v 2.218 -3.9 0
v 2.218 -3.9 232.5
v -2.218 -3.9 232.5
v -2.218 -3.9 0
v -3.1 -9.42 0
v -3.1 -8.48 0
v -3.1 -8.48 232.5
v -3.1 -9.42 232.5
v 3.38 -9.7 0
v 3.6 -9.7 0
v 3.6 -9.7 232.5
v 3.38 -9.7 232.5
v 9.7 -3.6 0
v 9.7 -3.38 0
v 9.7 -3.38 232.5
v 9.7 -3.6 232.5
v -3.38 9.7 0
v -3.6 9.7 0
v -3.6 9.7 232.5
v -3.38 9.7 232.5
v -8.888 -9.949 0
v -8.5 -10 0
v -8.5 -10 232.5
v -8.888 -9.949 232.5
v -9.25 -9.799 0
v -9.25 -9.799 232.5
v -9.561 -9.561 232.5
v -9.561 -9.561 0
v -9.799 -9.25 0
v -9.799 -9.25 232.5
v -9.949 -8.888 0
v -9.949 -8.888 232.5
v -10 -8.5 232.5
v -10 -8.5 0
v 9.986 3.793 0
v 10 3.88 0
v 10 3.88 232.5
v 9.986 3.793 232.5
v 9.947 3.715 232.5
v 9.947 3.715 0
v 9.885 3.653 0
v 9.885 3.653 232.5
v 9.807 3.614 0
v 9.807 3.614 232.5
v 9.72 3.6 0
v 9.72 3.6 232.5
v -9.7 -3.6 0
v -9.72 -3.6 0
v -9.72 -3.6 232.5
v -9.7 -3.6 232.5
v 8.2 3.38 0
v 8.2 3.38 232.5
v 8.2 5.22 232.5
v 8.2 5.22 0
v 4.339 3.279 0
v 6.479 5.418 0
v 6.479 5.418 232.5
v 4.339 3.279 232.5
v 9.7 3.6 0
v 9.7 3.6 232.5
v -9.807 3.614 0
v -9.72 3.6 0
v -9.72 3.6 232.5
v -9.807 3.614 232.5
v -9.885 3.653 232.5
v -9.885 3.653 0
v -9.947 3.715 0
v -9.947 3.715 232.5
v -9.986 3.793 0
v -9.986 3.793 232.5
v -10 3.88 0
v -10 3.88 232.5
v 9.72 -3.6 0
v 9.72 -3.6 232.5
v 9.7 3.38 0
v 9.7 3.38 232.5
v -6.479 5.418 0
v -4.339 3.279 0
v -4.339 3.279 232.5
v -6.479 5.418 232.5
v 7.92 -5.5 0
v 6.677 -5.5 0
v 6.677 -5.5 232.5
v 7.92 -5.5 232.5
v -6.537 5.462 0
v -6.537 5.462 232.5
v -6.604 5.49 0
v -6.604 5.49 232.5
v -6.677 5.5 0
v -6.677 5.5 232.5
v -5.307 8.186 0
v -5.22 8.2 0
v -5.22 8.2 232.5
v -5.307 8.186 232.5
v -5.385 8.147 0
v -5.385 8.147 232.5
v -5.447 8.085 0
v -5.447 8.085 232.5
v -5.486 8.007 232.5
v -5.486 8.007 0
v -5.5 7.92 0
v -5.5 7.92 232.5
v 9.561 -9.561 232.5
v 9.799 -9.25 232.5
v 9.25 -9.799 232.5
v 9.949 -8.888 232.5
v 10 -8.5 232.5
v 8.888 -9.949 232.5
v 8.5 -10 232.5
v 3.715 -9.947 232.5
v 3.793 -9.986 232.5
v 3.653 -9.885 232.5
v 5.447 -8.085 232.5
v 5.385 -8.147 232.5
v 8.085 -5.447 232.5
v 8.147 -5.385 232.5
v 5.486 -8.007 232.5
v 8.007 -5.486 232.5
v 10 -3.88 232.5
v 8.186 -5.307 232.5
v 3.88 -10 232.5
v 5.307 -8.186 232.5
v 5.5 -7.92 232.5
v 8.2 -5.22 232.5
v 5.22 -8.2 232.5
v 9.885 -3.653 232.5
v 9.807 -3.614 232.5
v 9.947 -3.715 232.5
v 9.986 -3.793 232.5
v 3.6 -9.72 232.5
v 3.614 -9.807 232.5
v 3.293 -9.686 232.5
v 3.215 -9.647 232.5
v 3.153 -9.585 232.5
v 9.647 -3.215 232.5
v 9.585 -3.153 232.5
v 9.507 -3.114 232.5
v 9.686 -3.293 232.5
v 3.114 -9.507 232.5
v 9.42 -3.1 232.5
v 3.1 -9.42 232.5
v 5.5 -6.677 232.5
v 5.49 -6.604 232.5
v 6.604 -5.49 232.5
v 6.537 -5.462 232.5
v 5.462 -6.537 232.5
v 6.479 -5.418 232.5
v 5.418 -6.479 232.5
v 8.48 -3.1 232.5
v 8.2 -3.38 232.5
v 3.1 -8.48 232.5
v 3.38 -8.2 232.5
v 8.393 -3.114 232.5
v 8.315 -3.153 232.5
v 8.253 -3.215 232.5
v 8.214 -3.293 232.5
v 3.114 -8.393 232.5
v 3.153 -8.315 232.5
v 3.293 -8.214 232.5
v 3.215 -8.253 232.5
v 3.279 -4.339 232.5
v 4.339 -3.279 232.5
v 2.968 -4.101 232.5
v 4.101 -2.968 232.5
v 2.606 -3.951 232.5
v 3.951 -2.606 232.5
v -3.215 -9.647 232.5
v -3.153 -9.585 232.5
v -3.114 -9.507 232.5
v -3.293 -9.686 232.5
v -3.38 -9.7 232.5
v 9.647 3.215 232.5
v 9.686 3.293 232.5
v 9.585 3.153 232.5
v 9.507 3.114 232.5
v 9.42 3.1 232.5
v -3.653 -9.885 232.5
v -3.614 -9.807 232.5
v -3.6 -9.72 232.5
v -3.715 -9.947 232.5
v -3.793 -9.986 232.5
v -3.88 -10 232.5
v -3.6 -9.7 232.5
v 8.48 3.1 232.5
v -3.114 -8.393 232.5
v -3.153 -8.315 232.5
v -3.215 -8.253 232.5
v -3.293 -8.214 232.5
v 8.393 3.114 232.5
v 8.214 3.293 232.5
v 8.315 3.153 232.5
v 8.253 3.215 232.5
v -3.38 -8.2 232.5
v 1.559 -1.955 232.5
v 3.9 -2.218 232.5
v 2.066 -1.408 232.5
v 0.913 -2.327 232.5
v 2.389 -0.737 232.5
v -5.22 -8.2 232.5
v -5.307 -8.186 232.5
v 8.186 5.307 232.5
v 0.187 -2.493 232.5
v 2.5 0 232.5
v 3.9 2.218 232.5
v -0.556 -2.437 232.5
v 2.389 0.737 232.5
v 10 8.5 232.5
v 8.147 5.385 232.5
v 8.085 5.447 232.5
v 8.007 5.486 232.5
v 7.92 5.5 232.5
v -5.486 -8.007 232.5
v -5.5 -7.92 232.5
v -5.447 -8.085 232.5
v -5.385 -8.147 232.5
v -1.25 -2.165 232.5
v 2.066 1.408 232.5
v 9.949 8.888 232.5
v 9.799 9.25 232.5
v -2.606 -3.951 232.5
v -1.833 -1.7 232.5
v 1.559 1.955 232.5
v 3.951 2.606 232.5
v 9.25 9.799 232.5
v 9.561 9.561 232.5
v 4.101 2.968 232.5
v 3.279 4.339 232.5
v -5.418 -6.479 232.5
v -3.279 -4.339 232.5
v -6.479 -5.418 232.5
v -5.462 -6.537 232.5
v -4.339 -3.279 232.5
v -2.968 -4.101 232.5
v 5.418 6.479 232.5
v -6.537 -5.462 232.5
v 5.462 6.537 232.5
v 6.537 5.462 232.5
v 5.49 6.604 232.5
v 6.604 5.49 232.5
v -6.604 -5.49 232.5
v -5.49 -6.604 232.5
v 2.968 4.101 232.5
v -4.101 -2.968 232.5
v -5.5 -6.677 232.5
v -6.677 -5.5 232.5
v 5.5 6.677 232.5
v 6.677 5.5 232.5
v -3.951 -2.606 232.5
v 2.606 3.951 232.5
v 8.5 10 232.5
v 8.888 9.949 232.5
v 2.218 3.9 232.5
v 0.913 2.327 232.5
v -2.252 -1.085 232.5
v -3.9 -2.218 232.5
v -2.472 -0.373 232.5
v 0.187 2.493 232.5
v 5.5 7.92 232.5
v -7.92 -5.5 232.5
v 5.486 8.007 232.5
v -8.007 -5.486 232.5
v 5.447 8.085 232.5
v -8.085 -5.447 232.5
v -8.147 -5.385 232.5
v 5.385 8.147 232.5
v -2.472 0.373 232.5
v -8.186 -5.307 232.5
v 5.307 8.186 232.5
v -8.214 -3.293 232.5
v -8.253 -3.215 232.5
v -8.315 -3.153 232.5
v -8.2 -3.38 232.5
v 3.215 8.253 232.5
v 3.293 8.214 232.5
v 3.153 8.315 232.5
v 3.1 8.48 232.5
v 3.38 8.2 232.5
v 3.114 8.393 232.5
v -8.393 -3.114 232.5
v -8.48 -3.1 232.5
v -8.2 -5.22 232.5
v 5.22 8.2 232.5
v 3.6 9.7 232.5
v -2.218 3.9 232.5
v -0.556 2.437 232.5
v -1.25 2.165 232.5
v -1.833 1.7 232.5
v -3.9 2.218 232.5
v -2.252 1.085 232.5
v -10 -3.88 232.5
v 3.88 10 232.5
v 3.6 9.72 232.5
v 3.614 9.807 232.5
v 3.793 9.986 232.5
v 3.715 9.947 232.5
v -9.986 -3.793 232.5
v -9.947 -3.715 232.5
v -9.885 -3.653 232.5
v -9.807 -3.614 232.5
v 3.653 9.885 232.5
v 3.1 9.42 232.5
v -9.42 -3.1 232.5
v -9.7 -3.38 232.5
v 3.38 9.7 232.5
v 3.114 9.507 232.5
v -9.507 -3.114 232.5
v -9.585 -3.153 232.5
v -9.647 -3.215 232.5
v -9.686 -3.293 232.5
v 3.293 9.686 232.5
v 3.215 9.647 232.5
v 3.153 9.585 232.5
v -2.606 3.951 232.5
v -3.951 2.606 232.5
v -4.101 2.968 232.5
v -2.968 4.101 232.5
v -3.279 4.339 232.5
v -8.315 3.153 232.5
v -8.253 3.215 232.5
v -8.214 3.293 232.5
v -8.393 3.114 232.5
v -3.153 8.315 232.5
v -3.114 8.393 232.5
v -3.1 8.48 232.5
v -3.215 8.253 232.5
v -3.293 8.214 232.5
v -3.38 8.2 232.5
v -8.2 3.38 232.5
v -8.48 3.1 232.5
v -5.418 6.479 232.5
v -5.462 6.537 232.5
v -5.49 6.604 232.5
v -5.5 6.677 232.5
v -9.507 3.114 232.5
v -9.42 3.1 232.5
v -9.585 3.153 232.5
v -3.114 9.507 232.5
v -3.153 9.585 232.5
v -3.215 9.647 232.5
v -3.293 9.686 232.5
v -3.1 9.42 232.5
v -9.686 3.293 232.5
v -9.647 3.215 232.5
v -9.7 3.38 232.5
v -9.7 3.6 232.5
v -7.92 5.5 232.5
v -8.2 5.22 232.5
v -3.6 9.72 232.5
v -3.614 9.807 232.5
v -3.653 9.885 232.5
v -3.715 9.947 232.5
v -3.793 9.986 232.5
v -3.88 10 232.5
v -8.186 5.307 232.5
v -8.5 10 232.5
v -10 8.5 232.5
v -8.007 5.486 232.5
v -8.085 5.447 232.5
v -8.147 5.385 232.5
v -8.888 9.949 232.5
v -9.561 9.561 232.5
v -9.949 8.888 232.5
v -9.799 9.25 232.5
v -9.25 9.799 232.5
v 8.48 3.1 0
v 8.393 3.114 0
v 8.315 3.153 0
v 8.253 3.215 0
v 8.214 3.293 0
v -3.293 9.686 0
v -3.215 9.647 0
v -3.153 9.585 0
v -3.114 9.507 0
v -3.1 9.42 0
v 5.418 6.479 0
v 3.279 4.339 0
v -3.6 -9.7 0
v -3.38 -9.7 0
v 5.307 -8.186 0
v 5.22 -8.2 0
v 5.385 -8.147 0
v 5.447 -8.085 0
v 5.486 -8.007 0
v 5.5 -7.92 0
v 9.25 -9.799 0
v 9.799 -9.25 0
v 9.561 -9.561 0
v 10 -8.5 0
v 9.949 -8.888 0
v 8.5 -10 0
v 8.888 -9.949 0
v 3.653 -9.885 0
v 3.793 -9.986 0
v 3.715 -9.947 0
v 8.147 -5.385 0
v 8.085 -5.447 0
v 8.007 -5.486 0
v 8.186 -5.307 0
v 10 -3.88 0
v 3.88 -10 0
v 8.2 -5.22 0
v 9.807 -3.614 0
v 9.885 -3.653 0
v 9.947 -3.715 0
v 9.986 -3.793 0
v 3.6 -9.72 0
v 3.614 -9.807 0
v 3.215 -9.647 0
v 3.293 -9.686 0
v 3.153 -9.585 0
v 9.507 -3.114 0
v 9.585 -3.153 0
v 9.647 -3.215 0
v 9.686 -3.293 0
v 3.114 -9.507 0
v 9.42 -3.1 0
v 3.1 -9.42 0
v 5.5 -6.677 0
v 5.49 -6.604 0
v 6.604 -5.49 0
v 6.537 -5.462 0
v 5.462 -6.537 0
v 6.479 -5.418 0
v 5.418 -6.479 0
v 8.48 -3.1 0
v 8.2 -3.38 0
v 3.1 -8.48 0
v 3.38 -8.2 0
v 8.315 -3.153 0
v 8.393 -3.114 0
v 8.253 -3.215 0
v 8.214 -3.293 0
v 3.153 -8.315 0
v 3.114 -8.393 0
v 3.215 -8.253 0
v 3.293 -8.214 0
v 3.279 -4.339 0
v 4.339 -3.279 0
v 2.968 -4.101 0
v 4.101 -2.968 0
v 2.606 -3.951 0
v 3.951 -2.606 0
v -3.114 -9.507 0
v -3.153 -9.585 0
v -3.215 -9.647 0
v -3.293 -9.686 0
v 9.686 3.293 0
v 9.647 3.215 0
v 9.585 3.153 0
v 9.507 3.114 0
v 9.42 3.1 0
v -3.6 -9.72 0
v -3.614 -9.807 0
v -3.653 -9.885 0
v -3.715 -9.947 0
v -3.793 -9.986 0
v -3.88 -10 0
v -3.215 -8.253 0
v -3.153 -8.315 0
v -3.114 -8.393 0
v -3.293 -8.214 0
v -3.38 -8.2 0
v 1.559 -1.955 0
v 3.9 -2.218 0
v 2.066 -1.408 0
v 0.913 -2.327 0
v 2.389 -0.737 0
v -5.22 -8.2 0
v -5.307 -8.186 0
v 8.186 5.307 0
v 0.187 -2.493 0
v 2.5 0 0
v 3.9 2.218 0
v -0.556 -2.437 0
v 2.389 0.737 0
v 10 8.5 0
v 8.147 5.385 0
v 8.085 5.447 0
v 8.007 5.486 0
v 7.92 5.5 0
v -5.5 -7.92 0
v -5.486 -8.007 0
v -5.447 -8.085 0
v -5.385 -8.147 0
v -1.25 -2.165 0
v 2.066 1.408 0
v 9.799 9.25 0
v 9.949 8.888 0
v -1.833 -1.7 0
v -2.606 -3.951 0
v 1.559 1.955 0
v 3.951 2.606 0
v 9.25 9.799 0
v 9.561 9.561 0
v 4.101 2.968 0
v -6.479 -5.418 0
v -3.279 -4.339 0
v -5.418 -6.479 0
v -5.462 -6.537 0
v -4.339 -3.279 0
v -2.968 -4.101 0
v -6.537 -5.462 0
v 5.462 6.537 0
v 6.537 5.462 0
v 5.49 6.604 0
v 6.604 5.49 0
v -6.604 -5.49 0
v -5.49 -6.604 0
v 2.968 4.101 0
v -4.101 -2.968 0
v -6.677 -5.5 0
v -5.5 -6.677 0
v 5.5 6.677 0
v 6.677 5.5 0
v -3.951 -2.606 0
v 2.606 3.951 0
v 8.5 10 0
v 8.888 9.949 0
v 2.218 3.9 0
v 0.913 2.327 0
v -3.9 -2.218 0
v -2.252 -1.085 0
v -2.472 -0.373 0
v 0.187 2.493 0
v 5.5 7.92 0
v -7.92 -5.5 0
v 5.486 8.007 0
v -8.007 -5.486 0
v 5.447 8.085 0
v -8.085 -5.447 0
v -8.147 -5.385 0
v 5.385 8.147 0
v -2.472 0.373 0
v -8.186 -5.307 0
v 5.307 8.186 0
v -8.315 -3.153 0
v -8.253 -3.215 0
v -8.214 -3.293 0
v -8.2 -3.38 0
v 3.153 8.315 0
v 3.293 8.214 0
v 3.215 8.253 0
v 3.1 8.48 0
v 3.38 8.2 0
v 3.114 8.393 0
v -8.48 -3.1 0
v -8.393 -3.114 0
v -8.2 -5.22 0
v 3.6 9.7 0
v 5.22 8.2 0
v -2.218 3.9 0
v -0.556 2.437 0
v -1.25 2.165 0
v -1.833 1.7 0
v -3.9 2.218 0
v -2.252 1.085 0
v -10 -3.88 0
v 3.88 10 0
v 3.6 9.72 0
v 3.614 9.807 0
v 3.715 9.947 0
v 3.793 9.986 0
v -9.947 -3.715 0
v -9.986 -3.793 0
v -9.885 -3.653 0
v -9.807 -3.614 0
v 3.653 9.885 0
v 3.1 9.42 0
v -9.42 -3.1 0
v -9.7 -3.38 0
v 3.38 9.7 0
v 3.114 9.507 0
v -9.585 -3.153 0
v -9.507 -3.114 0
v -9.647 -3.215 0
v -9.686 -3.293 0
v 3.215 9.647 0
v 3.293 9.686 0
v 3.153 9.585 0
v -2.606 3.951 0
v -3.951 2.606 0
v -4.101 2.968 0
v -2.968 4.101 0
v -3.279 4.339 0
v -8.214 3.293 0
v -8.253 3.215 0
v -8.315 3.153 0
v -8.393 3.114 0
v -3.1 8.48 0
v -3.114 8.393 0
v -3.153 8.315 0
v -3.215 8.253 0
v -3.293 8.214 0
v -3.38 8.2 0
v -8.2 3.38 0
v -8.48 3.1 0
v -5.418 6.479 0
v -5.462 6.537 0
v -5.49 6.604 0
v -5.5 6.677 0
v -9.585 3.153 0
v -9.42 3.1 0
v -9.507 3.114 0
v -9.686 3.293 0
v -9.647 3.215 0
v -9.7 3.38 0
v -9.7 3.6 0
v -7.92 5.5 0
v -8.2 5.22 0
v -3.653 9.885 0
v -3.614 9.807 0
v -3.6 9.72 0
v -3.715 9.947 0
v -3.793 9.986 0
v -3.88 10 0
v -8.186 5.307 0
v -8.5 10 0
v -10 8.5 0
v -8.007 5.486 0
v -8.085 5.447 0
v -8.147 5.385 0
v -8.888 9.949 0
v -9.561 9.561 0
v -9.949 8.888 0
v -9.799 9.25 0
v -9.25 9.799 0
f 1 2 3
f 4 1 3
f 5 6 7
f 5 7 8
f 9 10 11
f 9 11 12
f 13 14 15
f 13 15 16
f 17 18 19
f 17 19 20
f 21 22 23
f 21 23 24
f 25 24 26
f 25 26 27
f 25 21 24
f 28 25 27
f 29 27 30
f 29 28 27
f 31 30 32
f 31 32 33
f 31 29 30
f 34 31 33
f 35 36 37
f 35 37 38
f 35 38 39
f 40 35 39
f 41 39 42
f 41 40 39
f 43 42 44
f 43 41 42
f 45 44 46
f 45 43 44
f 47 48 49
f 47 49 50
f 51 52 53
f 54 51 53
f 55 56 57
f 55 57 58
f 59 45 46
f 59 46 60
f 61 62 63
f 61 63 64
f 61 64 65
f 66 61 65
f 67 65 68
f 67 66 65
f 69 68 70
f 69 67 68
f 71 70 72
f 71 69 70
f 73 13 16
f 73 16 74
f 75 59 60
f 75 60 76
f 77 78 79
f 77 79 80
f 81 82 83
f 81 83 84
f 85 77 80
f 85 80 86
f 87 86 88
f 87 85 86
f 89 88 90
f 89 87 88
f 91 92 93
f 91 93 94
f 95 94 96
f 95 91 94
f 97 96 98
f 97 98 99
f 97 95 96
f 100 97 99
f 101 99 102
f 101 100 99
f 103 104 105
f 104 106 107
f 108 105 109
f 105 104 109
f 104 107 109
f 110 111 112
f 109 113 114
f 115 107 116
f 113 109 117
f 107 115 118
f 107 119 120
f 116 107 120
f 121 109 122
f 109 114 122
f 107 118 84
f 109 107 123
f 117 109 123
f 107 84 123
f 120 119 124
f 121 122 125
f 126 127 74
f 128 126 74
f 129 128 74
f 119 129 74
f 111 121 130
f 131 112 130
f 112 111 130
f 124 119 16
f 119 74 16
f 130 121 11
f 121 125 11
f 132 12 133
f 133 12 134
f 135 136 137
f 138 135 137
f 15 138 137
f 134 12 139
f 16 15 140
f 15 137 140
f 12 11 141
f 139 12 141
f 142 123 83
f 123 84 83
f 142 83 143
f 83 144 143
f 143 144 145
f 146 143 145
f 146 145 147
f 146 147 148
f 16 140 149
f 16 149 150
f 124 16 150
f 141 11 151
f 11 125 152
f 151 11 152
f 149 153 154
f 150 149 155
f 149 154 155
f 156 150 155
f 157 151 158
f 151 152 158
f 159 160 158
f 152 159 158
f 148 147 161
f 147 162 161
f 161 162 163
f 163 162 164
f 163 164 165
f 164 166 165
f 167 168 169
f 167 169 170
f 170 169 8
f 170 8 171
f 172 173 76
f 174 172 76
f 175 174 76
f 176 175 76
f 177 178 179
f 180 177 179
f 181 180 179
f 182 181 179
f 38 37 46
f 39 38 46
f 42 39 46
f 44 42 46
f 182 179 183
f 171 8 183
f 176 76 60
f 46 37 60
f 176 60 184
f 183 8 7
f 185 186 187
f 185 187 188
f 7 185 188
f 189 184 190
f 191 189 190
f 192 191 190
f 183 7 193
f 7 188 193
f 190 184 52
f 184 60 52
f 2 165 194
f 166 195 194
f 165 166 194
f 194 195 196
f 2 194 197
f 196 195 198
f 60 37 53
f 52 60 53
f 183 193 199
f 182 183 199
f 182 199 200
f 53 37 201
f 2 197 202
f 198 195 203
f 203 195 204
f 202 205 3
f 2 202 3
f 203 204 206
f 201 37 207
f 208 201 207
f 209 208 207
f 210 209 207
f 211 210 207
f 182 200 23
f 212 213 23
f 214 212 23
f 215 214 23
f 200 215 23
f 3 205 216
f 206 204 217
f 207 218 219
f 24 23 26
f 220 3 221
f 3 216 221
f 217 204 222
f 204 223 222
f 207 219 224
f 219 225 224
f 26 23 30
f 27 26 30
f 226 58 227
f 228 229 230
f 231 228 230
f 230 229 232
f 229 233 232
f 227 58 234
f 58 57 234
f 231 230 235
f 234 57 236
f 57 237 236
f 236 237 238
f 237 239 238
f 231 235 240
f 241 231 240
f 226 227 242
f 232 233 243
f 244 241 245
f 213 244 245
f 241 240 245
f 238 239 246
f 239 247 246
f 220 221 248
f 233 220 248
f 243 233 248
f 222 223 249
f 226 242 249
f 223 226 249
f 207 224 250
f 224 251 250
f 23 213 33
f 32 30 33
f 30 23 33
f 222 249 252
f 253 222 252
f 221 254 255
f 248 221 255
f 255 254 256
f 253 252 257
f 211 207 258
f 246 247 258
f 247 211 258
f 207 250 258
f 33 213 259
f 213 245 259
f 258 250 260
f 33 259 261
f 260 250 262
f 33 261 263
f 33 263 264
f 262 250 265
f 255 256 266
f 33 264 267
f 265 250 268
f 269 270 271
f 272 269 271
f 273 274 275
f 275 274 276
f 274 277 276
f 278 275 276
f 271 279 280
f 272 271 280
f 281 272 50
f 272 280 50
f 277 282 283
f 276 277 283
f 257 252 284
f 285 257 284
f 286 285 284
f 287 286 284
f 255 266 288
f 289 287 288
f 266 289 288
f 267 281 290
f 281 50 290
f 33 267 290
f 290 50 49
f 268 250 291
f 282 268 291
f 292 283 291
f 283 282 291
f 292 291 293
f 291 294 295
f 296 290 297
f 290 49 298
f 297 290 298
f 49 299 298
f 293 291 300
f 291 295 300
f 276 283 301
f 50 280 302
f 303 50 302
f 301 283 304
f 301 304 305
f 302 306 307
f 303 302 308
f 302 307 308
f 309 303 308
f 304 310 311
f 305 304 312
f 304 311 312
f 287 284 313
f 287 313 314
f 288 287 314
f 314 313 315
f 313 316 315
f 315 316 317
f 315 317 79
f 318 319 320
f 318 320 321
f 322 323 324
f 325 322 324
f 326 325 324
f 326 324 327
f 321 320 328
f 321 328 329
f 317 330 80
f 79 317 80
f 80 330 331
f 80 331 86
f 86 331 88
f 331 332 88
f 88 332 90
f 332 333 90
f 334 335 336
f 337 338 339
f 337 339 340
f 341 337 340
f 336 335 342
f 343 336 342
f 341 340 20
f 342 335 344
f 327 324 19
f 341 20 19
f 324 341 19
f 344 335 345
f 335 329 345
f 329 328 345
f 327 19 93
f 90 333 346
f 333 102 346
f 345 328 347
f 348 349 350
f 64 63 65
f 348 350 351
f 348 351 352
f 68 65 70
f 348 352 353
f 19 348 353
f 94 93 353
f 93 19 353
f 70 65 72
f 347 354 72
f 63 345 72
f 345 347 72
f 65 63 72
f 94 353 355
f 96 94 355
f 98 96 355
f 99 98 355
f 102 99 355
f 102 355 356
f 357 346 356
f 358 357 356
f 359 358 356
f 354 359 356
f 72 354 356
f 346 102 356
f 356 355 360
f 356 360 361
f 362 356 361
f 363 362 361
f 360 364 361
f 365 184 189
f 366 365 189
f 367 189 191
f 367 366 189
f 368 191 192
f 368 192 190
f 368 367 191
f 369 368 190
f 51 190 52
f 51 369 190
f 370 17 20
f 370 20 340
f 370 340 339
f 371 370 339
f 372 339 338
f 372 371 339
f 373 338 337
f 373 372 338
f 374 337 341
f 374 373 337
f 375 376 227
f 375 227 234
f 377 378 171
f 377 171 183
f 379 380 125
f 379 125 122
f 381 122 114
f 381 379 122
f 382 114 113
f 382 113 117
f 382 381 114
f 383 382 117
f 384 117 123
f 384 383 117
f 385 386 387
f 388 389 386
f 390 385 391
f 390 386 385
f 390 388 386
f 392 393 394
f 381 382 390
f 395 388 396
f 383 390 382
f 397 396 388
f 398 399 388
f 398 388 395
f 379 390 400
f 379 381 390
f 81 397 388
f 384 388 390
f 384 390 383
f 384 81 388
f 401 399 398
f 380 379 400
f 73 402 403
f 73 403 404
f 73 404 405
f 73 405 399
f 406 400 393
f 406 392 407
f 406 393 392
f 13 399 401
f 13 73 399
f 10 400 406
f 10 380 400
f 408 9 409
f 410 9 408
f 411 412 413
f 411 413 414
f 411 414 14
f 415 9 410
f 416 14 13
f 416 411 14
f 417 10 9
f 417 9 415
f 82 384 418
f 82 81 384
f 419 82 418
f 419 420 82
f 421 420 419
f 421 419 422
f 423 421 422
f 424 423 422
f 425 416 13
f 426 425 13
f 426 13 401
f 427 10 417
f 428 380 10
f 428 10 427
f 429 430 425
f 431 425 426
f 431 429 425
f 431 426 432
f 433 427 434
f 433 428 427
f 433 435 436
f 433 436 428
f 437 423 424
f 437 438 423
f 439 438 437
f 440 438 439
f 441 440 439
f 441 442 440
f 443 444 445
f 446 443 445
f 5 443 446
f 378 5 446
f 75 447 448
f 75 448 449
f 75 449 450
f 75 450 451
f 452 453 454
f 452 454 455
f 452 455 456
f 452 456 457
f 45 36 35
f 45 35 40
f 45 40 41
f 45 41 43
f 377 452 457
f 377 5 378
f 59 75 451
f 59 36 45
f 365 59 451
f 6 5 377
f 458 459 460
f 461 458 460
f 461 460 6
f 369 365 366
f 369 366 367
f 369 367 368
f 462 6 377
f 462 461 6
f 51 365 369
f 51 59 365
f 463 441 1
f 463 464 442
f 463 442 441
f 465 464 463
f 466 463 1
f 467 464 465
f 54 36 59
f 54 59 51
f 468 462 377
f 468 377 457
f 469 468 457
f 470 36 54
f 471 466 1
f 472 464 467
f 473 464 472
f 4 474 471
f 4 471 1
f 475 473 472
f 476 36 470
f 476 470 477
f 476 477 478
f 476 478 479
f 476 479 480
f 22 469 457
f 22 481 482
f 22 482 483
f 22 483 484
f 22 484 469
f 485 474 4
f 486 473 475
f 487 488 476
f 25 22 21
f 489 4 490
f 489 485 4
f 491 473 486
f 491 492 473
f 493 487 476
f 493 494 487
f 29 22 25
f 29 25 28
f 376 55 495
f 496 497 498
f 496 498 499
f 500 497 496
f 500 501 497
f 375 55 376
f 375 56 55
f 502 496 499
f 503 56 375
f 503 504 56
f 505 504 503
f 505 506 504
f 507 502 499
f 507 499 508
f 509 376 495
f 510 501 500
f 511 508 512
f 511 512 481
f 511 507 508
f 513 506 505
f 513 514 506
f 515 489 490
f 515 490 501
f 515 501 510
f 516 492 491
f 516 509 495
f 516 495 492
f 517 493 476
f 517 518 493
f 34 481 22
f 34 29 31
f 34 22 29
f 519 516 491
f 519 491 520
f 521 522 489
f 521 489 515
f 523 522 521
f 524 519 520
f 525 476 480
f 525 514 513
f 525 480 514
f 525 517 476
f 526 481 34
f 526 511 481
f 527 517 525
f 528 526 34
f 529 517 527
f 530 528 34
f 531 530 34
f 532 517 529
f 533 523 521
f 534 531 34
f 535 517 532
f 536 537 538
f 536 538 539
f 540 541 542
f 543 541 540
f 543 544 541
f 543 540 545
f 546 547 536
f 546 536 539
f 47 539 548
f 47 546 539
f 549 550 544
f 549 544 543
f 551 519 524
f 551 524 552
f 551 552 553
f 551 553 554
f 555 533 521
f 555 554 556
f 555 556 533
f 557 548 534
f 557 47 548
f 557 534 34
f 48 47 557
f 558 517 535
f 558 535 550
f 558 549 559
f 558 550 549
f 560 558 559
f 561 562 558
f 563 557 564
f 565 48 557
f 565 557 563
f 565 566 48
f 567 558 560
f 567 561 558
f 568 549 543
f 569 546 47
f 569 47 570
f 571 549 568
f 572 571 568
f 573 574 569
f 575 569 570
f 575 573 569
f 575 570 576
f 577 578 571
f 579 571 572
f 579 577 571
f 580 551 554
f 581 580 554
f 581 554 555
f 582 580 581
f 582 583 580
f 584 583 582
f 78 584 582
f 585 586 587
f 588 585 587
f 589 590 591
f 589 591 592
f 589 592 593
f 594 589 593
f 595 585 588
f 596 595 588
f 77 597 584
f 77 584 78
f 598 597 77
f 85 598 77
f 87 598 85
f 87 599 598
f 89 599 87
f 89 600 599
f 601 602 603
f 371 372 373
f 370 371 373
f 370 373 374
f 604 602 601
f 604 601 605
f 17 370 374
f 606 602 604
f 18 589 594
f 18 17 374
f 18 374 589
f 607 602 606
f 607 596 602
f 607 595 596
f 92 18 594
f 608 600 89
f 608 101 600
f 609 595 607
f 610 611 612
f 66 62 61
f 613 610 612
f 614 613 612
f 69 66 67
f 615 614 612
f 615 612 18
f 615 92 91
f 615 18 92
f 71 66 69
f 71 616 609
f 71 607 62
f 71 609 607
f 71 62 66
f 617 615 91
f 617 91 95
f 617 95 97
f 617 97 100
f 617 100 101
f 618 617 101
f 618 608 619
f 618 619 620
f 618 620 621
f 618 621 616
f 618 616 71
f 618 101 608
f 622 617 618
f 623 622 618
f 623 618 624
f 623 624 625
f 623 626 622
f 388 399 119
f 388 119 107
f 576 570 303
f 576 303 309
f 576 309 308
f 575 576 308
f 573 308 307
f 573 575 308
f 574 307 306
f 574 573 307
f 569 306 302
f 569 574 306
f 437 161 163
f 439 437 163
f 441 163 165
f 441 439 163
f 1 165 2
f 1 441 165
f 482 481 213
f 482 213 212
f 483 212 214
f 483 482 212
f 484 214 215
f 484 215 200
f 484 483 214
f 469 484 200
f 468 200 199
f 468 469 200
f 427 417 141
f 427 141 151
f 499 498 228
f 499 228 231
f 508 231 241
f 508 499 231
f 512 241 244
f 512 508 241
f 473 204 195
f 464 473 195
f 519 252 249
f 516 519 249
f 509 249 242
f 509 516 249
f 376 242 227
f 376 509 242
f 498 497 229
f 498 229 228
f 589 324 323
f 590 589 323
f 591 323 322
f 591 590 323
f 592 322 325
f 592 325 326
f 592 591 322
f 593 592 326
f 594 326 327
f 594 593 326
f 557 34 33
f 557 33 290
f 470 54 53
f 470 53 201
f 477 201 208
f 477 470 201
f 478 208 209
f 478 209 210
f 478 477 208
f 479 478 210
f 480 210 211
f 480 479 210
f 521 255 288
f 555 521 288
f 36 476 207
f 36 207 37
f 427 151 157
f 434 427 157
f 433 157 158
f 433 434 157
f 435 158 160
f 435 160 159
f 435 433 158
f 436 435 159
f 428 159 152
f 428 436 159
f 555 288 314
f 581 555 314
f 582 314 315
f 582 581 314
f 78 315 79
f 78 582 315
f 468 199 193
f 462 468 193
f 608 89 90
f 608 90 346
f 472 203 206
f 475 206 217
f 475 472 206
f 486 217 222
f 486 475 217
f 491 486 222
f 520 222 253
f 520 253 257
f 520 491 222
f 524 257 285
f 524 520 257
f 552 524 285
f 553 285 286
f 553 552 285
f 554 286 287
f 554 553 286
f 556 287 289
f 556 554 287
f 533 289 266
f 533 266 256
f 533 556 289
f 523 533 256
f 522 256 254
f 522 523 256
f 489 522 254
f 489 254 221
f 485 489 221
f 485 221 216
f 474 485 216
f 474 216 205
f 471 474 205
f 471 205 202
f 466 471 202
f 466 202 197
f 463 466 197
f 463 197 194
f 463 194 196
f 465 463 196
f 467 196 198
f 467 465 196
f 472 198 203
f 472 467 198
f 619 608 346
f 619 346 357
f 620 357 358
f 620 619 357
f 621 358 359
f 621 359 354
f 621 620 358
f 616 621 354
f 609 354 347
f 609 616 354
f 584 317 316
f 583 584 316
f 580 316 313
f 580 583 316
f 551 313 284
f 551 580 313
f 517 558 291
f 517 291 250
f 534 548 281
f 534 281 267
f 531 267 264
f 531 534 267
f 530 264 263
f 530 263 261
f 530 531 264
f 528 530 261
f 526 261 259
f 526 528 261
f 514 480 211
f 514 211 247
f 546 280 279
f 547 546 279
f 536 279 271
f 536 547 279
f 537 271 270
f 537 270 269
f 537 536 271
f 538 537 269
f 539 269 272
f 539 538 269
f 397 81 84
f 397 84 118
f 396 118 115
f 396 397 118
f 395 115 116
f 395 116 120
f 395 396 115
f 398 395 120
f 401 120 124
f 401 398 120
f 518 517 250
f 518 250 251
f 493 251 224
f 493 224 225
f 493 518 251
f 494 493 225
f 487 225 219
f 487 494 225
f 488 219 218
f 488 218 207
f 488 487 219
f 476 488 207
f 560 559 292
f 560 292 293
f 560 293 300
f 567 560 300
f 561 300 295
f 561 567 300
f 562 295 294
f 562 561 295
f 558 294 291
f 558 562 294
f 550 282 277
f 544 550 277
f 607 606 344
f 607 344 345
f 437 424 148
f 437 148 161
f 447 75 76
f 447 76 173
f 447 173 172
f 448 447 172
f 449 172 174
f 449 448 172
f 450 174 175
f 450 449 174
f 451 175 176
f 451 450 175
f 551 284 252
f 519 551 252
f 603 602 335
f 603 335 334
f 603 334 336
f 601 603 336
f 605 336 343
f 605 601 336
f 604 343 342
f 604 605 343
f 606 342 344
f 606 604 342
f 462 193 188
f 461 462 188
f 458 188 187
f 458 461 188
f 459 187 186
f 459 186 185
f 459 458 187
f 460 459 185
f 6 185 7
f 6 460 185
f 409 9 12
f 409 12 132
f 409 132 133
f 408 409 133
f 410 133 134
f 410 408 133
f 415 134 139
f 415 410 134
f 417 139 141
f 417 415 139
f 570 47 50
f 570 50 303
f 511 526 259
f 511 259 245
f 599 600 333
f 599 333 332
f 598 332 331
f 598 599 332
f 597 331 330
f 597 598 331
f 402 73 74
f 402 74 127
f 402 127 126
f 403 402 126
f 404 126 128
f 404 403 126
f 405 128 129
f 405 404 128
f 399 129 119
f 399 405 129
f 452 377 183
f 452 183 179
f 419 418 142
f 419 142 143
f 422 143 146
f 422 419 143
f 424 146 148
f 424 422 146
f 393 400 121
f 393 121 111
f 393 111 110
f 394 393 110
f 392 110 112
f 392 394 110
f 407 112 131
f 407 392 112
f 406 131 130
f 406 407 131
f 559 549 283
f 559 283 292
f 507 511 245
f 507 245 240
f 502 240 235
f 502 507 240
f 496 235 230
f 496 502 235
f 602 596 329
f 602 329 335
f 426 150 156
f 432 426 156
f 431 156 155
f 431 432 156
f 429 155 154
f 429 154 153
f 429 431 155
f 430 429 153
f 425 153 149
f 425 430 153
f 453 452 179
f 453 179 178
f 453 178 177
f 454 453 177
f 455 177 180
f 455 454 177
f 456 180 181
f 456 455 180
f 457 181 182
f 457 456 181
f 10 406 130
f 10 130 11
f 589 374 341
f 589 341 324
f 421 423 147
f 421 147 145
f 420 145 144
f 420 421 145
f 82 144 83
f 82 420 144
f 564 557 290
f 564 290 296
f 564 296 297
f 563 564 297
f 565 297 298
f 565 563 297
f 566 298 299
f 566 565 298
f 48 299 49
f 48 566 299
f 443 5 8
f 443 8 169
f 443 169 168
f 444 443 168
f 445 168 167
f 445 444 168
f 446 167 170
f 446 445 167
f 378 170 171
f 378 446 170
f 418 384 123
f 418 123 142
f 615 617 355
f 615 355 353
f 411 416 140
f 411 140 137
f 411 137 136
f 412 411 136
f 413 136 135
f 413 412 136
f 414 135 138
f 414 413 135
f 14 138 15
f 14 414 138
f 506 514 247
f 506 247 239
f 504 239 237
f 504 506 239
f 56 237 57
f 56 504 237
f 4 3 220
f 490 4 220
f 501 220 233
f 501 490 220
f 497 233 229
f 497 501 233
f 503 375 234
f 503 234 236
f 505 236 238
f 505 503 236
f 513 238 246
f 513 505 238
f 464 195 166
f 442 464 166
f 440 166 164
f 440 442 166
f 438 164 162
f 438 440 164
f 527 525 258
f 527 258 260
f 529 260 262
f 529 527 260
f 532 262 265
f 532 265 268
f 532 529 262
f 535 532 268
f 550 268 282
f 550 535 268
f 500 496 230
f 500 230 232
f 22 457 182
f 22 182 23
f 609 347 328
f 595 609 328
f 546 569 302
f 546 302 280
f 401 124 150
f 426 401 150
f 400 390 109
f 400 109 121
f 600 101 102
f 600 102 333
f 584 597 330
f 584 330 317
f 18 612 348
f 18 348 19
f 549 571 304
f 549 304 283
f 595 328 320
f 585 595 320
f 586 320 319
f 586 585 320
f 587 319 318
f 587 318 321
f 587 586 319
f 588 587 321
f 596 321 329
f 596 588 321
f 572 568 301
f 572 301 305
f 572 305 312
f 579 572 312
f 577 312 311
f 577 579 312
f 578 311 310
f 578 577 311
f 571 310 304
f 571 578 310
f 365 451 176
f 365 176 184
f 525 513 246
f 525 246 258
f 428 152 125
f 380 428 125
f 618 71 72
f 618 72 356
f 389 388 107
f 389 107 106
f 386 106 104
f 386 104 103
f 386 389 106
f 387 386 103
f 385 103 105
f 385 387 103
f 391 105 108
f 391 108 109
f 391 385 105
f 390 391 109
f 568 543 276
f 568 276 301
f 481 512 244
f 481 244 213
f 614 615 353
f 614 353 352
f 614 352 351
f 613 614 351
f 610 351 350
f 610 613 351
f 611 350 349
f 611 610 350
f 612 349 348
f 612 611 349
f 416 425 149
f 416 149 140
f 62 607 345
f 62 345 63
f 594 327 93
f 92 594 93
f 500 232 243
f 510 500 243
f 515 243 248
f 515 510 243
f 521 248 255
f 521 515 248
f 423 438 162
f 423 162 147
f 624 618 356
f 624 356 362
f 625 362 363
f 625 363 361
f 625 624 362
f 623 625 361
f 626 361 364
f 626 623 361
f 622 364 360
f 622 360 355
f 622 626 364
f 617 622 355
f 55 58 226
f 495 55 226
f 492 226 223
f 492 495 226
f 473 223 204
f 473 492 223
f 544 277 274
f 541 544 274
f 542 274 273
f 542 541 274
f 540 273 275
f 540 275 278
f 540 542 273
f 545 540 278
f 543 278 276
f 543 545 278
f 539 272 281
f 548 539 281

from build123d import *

# Parameters (mm, degrees)
CROQUIS3_R                = 2.5
PG20_T_SLOT_20X20_1_DEPTH = 232.5


with BuildPart() as part:
    # Croquis3 → Pg20_t_slot 20X20(1) (new body)
    with BuildSketch(Plane.XY):
        with BuildLine():
            Line((-2.218019485, 3.9), (2.218019485, 3.9))
            ThreePointArc((2.218019485, 3.9), (2.792044633, 4.014180701), (3.278679656, 4.339339828))
            Line((3.278679656, 4.339339828), (5.417989899, 6.478650071))
            ThreePointArc((5.417989899, 6.478650071), (5.478686269, 6.569488608), (5.5, 6.676639969))
            Line((5.5, 6.676639969), (5.5, 7.92))
            ThreePointArc((5.5, 7.92), (5.417989899, 8.117989899), (5.22, 8.2))
            Line((5.22, 8.2), (3.38, 8.2))
            ThreePointArc((3.38, 8.2), (3.182010101, 8.282010101), (3.1, 8.48))
            Line((3.1, 8.48), (3.1, 9.42))
            ThreePointArc((3.1, 9.42), (3.182010101, 9.617989899), (3.38, 9.7))
            Line((3.38, 9.7), (3.6, 9.7))
            Line((3.6, 9.7), (3.6, 9.72))
            ThreePointArc((3.6, 9.72), (3.682010101, 9.917989899), (3.88, 10))
            Line((3.88, 10), (8.5, 10))
            ThreePointArc((8.5, 10), (9.560660172, 9.560660172), (10, 8.5))
            Line((10, 8.5), (10, 3.88))
            ThreePointArc((10, 3.88), (9.917989899, 3.682010101), (9.72, 3.6))
            Line((9.72, 3.6), (9.7, 3.6))
            Line((9.7, 3.6), (9.7, 3.38))
            ThreePointArc((9.7, 3.38), (9.617989899, 3.182010101), (9.42, 3.1))
            Line((9.42, 3.1), (8.48, 3.1))
            ThreePointArc((8.48, 3.1), (8.282010101, 3.182010101), (8.2, 3.38))
            Line((8.2, 3.38), (8.2, 5.22))
            ThreePointArc((8.2, 5.22), (8.117989899, 5.417989899), (7.92, 5.5))
            Line((7.92, 5.5), (6.676639969, 5.5))
            ThreePointArc((6.676639969, 5.5), (6.569488608, 5.478686269), (6.478650071, 5.417989899))
            Line((6.478650071, 5.417989899), (4.339339828, 3.278679656))
            ThreePointArc((4.339339828, 3.278679656), (4.014180701, 2.792044633), (3.9, 2.218019485))
            Line((3.9, 2.218019485), (3.9, -2.218019485))
            ThreePointArc((3.9, -2.218019485), (4.014180701, -2.792044633), (4.339339828, -3.278679656))
            Line((4.339339828, -3.278679656), (6.478650071, -5.417989899))
            ThreePointArc((6.478650071, -5.417989899), (6.569488608, -5.478686269), (6.676639969, -5.5))
            Line((6.676639969, -5.5), (7.92, -5.5))
            ThreePointArc((7.92, -5.5), (8.117989899, -5.417989899), (8.2, -5.22))
            Line((8.2, -5.22), (8.2, -3.38))
            ThreePointArc((8.2, -3.38), (8.282010101, -3.182010101), (8.48, -3.1))
            Line((8.48, -3.1), (9.42, -3.1))
            ThreePointArc((9.42, -3.1), (9.617989899, -3.182010101), (9.7, -3.38))
            Line((9.7, -3.38), (9.7, -3.6))
            Line((9.7, -3.6), (9.72, -3.6))
            ThreePointArc((9.72, -3.6), (9.917989899, -3.682010101), (10, -3.88))
            Line((10, -3.88), (10, -8.5))
            ThreePointArc((10, -8.5), (9.560660172, -9.560660172), (8.5, -10))
            Line((8.5, -10), (3.88, -10))
            ThreePointArc((3.88, -10), (3.682010101, -9.917989899), (3.6, -9.72))
            Line((3.6, -9.72), (3.6, -9.7))
            Line((3.6, -9.7), (3.38, -9.7))
            ThreePointArc((3.38, -9.7), (3.182010101, -9.617989899), (3.1, -9.42))
            Line((3.1, -9.42), (3.1, -8.48))
            ThreePointArc((3.1, -8.48), (3.182010101, -8.282010101), (3.38, -8.2))
            Line((3.38, -8.2), (5.22, -8.2))
            ThreePointArc((5.22, -8.2), (5.417989899, -8.117989899), (5.5, -7.92))
            Line((5.5, -7.92), (5.5, -6.676639969))
            ThreePointArc((5.5, -6.676639969), (5.478686269, -6.569488608), (5.417989899, -6.478650071))
            Line((5.417989899, -6.478650071), (3.278679656, -4.339339828))
            ThreePointArc((3.278679656, -4.339339828), (2.792044633, -4.014180701), (2.218019485, -3.9))
            Line((2.218019485, -3.9), (-2.218019485, -3.9))
            ThreePointArc((-2.218019485, -3.9), (-2.792044633, -4.014180701), (-3.278679656, -4.339339828))
            Line((-3.278679656, -4.339339828), (-5.417989899, -6.478650071))
            ThreePointArc((-5.417989899, -6.478650071), (-5.478686269, -6.569488608), (-5.5, -6.676639969))
            Line((-5.5, -6.676639969), (-5.5, -7.92))
            ThreePointArc((-5.5, -7.92), (-5.417989899, -8.117989899), (-5.22, -8.2))
            Line((-5.22, -8.2), (-3.38, -8.2))
            ThreePointArc((-3.38, -8.2), (-3.182010101, -8.282010101), (-3.1, -8.48))
            Line((-3.1, -8.48), (-3.1, -9.42))
            ThreePointArc((-3.1, -9.42), (-3.182010101, -9.617989899), (-3.38, -9.7))
            Line((-3.38, -9.7), (-3.6, -9.7))
            Line((-3.6, -9.7), (-3.6, -9.72))
            ThreePointArc((-3.6, -9.72), (-3.682010101, -9.917989899), (-3.88, -10))
            Line((-3.88, -10), (-8.5, -10))
            ThreePointArc((-8.5, -10), (-9.560660172, -9.560660172), (-10, -8.5))
            Line((-10, -8.5), (-10, -3.88))
            ThreePointArc((-10, -3.88), (-9.917989899, -3.682010101), (-9.72, -3.6))
            Line((-9.72, -3.6), (-9.7, -3.6))
            Line((-9.7, -3.6), (-9.7, -3.38))
            ThreePointArc((-9.7, -3.38), (-9.617989899, -3.182010101), (-9.42, -3.1))
            Line((-9.42, -3.1), (-8.48, -3.1))
            ThreePointArc((-8.48, -3.1), (-8.282010101, -3.182010101), (-8.2, -3.38))
            Line((-8.2, -3.38), (-8.2, -5.22))
            ThreePointArc((-8.2, -5.22), (-8.117989899, -5.417989899), (-7.92, -5.5))
            Line((-7.92, -5.5), (-6.676639969, -5.5))
            ThreePointArc((-6.676639969, -5.5), (-6.569488608, -5.478686269), (-6.478650071, -5.417989899))
            Line((-6.478650071, -5.417989899), (-4.339339828, -3.278679656))
            ThreePointArc((-4.339339828, -3.278679656), (-4.014180701, -2.792044633), (-3.9, -2.218019485))
            Line((-3.9, -2.218019485), (-3.9, 2.218019485))
            ThreePointArc((-3.9, 2.218019485), (-4.014180701, 2.792044633), (-4.339339828, 3.278679656))
            Line((-4.339339828, 3.278679656), (-6.478650071, 5.417989899))
            ThreePointArc((-6.478650071, 5.417989899), (-6.569488608, 5.478686269), (-6.676639969, 5.5))
            Line((-6.676639969, 5.5), (-7.92, 5.5))
            ThreePointArc((-7.92, 5.5), (-8.117989899, 5.417989899), (-8.2, 5.22))
            Line((-8.2, 5.22), (-8.2, 3.38))
            ThreePointArc((-8.2, 3.38), (-8.282010101, 3.182010101), (-8.48, 3.1))
            Line((-8.48, 3.1), (-9.42, 3.1))
            ThreePointArc((-9.42, 3.1), (-9.617989899, 3.182010101), (-9.7, 3.38))
            Line((-9.7, 3.38), (-9.7, 3.6))
            Line((-9.7, 3.6), (-9.72, 3.6))
            ThreePointArc((-9.72, 3.6), (-9.917989899, 3.682010101), (-10, 3.88))
            Line((-10, 3.88), (-10, 8.5))
            ThreePointArc((-10, 8.5), (-9.560660172, 9.560660172), (-8.5, 10))
            Line((-8.5, 10), (-3.88, 10))
            ThreePointArc((-3.88, 10), (-3.682010101, 9.917989899), (-3.6, 9.72))
            Line((-3.6, 9.72), (-3.6, 9.7))
            Line((-3.6, 9.7), (-3.38, 9.7))
            ThreePointArc((-3.38, 9.7), (-3.182010101, 9.617989899), (-3.1, 9.42))
            Line((-3.1, 9.42), (-3.1, 8.48))
            ThreePointArc((-3.1, 8.48), (-3.182010101, 8.282010101), (-3.38, 8.2))
            Line((-3.38, 8.2), (-5.22, 8.2))
            ThreePointArc((-5.22, 8.2), (-5.417989899, 8.117989899), (-5.5, 7.92))
            Line((-5.5, 7.92), (-5.5, 6.676639969))
            ThreePointArc((-5.5, 6.676639969), (-5.478686269, 6.569488608), (-5.417989899, 6.478650071))
            Line((-5.417989899, 6.478650071), (-3.278679656, 4.339339828))
            ThreePointArc((-3.278679656, 4.339339828), (-2.792044633, 4.014180701), (-2.218019485, 3.9))
        make_face()
        Circle(CROQUIS3_R, mode=Mode.SUBTRACT)
    extrude(amount=PG20_T_SLOT_20X20_1_DEPTH)


solid = part.part
